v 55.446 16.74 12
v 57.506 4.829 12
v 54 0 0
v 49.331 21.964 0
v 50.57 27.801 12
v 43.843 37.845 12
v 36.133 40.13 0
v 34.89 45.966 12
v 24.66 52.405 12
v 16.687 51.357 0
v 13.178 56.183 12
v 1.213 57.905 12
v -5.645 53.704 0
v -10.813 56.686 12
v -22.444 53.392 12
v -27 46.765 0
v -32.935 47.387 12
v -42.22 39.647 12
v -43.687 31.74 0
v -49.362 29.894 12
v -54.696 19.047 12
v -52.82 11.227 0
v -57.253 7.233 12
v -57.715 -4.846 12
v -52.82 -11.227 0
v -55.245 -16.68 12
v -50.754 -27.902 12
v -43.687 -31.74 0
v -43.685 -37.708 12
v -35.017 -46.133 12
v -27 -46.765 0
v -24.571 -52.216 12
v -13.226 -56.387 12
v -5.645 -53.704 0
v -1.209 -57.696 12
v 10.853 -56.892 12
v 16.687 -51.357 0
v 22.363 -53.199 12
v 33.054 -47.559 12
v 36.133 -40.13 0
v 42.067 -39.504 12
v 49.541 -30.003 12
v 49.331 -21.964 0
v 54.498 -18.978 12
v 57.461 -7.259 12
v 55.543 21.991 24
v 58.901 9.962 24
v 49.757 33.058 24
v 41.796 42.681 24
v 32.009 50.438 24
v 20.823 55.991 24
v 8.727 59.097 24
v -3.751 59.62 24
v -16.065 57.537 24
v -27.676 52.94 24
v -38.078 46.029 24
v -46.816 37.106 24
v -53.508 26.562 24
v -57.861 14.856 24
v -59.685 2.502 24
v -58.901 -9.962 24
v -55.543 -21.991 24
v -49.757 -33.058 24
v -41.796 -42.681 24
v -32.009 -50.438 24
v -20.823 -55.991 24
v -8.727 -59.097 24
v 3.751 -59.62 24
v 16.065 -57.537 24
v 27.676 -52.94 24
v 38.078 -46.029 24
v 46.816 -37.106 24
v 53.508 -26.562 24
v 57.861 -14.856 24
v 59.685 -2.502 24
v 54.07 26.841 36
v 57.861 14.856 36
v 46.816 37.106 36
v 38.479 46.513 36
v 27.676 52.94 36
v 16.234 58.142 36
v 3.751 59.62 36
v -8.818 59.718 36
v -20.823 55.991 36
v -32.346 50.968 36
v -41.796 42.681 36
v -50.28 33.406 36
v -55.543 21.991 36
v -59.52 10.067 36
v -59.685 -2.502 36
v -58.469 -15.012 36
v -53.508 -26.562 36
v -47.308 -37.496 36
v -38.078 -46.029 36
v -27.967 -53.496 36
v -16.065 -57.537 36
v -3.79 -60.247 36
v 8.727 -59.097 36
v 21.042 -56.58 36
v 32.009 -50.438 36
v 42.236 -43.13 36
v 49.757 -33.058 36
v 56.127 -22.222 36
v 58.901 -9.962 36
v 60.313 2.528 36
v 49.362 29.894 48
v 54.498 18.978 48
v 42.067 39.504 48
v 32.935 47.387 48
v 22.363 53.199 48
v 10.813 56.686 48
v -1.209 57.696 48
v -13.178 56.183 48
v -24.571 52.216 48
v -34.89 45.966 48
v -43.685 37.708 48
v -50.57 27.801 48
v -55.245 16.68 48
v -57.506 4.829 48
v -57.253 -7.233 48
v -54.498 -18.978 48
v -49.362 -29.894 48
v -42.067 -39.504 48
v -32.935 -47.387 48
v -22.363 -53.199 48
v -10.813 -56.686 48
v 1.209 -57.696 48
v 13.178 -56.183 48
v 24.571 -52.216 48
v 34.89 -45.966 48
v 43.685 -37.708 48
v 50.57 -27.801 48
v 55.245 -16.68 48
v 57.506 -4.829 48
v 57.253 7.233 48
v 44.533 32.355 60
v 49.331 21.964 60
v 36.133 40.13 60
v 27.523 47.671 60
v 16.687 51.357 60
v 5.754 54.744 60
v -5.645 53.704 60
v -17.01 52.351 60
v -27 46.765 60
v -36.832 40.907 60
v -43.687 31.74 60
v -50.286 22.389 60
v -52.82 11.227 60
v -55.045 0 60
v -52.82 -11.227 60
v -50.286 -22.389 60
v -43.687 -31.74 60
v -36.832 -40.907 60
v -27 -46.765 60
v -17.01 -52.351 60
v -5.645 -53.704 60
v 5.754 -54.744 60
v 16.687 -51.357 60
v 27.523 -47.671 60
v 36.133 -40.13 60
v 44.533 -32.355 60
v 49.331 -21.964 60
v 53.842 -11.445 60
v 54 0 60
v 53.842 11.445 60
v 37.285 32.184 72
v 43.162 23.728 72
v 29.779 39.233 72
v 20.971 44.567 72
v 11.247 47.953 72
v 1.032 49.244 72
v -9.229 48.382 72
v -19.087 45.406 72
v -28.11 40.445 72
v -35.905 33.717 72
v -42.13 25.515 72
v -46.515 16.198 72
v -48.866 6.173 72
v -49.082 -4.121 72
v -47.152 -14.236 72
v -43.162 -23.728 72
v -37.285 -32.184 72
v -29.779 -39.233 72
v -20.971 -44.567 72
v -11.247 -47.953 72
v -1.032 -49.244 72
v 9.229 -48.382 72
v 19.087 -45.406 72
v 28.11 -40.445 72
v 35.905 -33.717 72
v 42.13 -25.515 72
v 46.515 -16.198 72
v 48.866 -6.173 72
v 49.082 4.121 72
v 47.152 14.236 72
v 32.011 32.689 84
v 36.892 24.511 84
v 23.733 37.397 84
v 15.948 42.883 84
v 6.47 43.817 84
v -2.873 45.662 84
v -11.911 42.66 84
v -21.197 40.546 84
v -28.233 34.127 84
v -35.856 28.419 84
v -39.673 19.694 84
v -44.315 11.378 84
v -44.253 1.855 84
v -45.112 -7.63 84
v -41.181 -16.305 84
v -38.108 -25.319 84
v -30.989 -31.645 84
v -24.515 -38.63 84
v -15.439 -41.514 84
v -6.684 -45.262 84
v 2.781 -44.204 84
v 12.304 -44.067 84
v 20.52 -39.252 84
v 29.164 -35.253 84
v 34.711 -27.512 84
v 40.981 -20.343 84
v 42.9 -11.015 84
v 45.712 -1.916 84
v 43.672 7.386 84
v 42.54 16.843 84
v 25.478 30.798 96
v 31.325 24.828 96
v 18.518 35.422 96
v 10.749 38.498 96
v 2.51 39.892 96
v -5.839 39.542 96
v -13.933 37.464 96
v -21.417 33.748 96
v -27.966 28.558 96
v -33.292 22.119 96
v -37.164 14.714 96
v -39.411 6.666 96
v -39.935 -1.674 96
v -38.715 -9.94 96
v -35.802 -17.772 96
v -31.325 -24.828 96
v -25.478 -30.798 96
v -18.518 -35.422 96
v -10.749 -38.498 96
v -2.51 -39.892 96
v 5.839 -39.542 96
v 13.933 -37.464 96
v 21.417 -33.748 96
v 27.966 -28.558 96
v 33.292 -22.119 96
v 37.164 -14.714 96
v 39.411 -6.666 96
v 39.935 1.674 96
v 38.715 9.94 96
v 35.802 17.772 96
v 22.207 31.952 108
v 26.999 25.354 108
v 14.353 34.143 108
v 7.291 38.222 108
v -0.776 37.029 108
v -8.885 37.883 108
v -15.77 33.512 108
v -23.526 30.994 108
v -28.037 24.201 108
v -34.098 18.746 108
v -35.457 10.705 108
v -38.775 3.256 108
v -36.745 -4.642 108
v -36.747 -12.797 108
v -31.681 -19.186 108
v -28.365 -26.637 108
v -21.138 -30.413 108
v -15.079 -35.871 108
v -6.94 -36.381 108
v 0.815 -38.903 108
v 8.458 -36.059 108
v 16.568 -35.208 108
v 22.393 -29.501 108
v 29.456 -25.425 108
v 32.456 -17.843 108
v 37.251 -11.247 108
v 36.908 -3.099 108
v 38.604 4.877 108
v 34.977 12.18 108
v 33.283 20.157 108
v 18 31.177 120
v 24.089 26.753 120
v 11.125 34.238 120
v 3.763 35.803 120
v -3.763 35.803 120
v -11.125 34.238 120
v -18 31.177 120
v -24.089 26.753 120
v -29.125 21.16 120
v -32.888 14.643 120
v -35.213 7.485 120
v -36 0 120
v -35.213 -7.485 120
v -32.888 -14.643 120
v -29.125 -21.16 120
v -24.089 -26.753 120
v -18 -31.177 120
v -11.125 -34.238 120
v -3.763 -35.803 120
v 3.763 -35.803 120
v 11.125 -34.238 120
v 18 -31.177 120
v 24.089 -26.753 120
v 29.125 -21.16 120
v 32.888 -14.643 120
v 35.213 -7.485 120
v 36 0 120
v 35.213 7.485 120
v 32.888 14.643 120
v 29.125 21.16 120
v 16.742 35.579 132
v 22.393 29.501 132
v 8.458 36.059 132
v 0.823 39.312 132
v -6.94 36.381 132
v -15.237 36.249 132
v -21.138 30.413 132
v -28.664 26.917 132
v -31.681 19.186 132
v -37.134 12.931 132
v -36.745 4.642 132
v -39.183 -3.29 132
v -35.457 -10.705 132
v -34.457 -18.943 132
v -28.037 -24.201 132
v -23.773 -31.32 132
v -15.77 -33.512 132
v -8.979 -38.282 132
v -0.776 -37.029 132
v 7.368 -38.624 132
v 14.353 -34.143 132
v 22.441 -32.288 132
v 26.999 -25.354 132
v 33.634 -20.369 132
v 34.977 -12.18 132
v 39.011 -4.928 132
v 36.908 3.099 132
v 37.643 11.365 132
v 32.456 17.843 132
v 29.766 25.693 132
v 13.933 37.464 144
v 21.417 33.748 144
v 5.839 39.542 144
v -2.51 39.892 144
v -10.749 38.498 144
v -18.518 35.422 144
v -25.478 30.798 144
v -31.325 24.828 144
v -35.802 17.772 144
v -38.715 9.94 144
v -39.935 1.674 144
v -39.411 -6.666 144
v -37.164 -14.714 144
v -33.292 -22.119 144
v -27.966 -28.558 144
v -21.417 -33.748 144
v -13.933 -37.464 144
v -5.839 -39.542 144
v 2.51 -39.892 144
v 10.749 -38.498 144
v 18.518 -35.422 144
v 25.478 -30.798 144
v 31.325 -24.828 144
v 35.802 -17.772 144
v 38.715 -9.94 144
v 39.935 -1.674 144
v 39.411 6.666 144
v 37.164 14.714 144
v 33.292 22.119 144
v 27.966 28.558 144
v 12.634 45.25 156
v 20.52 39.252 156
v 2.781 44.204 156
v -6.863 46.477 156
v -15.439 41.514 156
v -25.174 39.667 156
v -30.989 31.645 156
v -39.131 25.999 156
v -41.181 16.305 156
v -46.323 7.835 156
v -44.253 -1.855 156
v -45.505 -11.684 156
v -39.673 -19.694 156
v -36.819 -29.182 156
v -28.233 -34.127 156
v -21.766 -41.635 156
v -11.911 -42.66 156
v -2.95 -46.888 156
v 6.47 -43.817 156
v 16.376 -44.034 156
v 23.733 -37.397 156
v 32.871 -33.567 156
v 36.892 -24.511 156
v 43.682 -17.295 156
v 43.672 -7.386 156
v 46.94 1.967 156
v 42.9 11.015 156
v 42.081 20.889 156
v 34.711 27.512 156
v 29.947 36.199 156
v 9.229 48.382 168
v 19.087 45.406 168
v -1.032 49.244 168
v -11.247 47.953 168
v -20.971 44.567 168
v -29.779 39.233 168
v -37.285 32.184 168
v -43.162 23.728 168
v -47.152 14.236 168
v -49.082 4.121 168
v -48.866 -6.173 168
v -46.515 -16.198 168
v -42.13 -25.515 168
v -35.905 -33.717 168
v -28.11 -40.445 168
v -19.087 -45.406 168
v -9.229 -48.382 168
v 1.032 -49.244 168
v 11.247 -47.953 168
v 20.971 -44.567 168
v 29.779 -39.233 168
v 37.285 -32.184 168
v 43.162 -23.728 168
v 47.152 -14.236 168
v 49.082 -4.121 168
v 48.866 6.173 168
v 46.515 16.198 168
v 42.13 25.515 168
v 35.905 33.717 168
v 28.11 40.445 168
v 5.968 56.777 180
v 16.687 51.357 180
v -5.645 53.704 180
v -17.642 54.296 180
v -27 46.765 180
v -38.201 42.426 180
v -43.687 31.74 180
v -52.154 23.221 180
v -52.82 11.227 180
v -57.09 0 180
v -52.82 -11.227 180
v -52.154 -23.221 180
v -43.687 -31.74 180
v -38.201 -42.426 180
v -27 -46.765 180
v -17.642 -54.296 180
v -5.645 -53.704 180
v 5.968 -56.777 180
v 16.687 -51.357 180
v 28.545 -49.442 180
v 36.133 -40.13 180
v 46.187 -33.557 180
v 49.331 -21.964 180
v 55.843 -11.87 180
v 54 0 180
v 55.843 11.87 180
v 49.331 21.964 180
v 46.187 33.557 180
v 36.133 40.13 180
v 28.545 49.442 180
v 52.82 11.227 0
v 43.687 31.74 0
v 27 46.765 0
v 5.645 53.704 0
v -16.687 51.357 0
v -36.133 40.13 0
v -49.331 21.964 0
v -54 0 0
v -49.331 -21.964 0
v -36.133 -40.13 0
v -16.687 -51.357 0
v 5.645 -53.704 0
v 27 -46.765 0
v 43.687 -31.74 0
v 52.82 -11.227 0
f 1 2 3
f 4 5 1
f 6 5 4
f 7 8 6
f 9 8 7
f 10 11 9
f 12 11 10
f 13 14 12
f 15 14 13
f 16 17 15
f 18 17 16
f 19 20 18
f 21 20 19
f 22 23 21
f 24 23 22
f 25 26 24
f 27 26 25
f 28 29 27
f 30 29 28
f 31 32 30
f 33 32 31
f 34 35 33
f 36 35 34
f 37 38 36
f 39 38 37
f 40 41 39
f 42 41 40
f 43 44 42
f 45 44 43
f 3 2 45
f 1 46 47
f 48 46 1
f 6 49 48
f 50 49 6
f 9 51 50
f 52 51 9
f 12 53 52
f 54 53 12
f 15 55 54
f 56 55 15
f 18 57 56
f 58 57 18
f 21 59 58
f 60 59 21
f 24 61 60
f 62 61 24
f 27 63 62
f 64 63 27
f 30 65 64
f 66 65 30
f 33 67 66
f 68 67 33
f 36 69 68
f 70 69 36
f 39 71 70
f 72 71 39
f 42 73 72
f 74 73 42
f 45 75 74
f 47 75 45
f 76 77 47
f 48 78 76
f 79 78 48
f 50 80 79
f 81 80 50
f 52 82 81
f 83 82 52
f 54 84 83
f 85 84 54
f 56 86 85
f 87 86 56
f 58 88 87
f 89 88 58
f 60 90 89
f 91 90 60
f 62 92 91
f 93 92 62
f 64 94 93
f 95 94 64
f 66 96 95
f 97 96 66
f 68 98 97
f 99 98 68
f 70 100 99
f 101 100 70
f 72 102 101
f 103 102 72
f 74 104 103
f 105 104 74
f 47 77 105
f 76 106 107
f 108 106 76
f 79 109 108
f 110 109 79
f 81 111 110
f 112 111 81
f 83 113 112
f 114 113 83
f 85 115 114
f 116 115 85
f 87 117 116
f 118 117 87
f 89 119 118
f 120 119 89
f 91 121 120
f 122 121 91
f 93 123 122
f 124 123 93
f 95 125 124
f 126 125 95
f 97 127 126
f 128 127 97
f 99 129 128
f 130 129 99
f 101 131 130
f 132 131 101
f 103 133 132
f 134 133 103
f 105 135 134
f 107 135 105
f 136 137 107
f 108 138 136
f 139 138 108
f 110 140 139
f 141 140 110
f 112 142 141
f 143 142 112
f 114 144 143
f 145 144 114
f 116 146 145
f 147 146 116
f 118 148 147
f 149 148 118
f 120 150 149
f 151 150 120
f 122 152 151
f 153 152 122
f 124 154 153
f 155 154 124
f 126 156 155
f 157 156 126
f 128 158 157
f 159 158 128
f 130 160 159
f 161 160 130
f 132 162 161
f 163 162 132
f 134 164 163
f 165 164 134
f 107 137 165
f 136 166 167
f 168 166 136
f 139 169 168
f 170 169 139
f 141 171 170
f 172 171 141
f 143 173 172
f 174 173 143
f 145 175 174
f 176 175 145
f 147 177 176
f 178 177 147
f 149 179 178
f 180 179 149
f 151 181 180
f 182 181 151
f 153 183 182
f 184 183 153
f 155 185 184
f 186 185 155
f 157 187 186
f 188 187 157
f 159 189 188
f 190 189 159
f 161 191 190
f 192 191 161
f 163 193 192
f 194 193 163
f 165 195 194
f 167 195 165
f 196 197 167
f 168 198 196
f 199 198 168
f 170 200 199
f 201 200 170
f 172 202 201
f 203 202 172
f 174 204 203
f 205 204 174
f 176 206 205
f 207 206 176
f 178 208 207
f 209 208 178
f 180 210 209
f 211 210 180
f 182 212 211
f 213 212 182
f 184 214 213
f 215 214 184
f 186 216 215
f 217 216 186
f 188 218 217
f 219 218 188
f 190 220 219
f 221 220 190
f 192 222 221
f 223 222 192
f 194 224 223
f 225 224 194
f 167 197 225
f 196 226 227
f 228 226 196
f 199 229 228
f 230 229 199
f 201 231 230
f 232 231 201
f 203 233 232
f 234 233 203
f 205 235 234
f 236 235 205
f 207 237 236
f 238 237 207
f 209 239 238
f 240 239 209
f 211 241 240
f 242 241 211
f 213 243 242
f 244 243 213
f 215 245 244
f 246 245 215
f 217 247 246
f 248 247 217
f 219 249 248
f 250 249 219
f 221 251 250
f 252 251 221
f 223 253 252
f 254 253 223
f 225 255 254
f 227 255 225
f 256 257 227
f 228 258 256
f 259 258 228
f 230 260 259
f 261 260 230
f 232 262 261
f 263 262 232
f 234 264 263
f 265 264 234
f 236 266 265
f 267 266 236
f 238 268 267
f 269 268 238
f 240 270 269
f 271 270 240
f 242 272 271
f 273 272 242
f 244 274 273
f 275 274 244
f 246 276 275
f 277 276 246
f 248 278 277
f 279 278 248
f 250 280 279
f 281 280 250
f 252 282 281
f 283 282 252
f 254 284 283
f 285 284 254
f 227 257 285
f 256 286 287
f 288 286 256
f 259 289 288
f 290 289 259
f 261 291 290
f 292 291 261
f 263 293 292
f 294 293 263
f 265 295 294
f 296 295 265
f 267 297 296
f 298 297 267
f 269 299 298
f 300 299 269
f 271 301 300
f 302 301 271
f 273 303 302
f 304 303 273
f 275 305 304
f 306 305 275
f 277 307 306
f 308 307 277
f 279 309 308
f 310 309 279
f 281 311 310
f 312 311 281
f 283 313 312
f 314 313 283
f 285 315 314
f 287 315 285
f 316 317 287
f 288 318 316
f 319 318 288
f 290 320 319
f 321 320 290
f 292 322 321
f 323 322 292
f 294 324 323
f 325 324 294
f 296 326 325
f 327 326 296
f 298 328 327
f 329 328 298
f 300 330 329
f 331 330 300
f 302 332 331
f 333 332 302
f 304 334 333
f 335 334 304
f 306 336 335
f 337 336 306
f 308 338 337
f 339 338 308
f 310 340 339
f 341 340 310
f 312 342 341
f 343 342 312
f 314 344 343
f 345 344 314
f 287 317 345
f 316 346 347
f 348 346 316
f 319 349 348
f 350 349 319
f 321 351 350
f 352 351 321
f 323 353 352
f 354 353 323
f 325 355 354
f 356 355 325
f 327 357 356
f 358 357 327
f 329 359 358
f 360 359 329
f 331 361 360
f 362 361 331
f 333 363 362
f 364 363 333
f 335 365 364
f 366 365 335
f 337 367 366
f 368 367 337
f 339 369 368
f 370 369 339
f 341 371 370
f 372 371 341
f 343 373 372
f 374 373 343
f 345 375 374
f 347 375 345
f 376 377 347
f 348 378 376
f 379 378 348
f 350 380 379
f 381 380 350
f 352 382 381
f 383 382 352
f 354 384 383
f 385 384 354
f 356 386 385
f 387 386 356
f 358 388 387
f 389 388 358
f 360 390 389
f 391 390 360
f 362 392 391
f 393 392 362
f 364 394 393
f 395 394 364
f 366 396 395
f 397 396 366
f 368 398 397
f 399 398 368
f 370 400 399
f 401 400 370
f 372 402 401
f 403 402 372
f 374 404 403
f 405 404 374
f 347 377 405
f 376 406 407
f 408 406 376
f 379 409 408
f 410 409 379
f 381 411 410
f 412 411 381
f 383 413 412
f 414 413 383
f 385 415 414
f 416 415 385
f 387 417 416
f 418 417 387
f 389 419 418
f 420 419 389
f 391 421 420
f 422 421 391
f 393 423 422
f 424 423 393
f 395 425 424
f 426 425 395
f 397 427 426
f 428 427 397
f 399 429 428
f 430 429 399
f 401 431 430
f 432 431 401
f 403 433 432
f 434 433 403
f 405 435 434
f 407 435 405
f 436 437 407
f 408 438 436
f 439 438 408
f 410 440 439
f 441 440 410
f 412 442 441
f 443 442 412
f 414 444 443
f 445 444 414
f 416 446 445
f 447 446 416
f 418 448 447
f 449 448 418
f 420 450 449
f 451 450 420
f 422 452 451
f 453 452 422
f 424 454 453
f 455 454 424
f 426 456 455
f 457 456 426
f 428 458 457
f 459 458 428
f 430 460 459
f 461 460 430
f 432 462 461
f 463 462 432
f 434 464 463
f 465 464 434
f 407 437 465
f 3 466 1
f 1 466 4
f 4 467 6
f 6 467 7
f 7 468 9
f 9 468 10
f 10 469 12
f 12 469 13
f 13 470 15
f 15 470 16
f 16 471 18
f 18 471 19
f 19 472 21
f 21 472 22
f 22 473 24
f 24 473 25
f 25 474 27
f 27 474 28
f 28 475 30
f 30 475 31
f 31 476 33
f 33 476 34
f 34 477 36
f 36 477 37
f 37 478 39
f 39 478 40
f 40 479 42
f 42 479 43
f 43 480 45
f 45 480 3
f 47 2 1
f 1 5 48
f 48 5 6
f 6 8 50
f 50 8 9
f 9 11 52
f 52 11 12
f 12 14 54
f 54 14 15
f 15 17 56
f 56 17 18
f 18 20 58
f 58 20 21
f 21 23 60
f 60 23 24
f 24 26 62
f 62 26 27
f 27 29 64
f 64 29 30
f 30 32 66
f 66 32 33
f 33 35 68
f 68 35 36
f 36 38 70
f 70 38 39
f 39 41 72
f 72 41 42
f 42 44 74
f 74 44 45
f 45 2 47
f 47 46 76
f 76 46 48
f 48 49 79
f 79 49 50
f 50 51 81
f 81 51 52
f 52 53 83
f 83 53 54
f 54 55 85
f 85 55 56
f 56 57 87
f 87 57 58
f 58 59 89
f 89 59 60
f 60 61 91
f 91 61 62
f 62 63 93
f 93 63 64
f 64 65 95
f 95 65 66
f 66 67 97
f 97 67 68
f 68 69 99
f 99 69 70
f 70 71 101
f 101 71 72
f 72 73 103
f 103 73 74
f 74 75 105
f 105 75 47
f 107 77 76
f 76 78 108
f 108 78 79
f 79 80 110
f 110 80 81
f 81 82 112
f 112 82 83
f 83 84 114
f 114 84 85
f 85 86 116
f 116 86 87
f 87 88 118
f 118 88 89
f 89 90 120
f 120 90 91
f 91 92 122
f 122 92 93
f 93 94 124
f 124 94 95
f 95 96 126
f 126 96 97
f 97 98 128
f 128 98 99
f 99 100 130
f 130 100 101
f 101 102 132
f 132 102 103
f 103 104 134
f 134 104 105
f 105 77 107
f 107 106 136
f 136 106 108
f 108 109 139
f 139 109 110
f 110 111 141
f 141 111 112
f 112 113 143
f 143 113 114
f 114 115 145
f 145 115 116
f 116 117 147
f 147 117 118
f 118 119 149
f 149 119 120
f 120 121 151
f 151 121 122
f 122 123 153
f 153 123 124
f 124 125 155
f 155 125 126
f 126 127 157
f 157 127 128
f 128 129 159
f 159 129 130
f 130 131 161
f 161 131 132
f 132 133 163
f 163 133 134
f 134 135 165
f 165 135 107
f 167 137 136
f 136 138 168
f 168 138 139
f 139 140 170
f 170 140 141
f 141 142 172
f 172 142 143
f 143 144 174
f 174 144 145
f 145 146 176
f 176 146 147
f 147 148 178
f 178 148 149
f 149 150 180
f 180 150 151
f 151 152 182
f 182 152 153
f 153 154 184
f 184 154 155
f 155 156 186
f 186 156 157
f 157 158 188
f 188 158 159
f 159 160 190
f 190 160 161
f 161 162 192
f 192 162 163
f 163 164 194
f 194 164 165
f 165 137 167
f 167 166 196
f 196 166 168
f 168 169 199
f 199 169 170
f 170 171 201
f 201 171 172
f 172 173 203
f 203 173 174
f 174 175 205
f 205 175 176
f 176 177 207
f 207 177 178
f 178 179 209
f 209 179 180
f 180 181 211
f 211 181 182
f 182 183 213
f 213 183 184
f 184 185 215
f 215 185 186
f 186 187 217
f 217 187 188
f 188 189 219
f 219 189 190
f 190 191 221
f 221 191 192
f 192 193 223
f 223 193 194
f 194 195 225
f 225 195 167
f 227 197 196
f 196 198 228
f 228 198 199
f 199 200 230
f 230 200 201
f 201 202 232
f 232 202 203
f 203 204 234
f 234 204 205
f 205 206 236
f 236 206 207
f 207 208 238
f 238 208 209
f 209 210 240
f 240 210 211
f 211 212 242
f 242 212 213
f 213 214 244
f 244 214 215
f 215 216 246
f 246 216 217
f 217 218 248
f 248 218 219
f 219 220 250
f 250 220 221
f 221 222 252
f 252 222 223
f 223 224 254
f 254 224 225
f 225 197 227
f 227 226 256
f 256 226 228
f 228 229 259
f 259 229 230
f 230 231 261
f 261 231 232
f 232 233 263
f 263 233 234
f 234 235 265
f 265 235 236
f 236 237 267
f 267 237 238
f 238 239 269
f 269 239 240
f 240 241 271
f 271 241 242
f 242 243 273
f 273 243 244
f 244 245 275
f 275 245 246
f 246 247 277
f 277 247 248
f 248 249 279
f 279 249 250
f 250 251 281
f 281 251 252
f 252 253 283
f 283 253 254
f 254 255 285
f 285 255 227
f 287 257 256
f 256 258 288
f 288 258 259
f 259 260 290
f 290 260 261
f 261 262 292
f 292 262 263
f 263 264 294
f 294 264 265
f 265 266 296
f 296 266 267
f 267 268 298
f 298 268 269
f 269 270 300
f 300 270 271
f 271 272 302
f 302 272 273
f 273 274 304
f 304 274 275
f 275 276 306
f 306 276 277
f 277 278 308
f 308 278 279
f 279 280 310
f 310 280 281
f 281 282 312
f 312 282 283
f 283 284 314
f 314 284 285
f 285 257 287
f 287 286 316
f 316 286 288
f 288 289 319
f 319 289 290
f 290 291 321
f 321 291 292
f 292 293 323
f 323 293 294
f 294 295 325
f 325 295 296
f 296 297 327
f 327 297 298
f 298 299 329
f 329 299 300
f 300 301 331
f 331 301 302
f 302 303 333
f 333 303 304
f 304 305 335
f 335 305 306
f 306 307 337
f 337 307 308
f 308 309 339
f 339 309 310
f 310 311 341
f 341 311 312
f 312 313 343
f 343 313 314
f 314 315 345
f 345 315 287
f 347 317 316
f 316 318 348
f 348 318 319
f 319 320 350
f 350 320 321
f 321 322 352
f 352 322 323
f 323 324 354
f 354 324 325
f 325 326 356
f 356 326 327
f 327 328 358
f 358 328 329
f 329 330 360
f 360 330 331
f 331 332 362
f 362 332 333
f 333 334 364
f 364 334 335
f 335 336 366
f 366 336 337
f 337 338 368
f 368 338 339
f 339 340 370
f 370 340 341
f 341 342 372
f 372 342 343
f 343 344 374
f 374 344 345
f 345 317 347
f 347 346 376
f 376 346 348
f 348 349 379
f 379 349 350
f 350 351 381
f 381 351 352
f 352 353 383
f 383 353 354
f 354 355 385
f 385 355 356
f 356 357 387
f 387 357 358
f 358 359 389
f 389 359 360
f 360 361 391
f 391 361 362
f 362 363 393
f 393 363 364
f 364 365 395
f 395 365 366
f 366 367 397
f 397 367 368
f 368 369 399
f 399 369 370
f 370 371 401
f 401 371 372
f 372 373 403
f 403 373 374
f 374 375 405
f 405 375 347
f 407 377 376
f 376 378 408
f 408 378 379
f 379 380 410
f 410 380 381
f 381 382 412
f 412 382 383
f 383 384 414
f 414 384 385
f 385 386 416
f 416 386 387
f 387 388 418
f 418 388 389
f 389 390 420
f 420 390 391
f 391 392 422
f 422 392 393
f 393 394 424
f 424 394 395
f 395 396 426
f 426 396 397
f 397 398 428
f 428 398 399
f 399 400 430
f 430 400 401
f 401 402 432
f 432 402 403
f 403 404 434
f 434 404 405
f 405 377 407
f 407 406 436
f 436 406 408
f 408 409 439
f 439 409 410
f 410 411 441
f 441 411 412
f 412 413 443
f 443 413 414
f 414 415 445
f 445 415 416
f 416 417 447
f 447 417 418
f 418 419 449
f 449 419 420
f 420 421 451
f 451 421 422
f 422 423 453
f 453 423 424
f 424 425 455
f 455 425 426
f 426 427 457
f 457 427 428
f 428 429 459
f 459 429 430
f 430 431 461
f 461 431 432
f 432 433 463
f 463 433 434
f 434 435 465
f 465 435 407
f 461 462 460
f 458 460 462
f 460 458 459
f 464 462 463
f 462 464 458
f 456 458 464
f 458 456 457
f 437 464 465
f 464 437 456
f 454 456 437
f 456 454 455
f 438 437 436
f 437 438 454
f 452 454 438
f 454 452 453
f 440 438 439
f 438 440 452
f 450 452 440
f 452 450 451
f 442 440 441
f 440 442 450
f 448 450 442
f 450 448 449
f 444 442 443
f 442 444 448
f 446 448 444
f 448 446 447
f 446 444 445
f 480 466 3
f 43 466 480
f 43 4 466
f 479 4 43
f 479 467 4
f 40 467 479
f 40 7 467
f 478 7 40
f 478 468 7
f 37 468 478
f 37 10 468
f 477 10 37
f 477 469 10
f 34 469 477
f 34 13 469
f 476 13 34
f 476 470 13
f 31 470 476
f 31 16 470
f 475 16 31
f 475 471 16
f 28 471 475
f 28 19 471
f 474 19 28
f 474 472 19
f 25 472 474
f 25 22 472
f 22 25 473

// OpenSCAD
// Define the shape and size parameters for the vase
shape_type = "vase2";  // Shape of the vase
base_radius = 60;       // Base radius of the vase
spike_amplitude = 10;   // Amplitude of spikes added to the surface
num_sides = 30;         // Number of sides for the vase's base (higher = smoother)
num_levels = 15;        // Number of vertical levels for detail
twist_factor = 0.4;     // Twisting factor for the shape
vase_color = "cyan";   // Visualization color

// Module to generate the vase
module vase() {
    total_height = 180 - 180 % num_levels;  // Total height adjusted to levels
    vertical_step = floor(180 / num_levels);  // Vertical step size
    angular_step = 360 / num_sides;          // Angular step size for sides

    // Generate the vertex points
    vertex_points = [
        for (z = [0:vertical_step:total_height])
            for (i = [0:angular_step:359])
                let(
                    // Calculate radius modifier based on shape and vertical position
                    radius_modifier = (shape_type == "cylinder") ? 1 :
                                     (shape_type == "vase1") ? 0.7 + 0.4 * sin(z * 1.9) :
                                     (shape_type == "vase2") ? 0.6 + 0.4 * pow(sin(z + 60), 2) :
                                     (shape_type == "glass") ? 0.6 + 0.4 * pow(sin(z * 0.7 - 30), 2) :
                                     (shape_type == "cup1") ? 0.65 + 0.3 * cos(z * 2 + 35) :
                                     (shape_type == "cup2") ? 0.6 + 0.35 * cos(180 - z + 50) * sin(180 - z * 2.5 + 45) :
                                     (shape_type == "bowl") ? 0.6 + 0.4 * sin(z * 0.5) :
                                     cos(z * 0.5),
                    // Adjust spike size dynamically
                    dynamic_spike = ((z / vertical_step) % 2 == 1 && (i / angular_step) % 2 == 1) ? spike_amplitude * sin(z * 0.1) : 0,
                    twist = z * twist_factor, // Twisting effect
                    final_radius = dynamic_spike + radius_modifier * base_radius,  // Total radius
                    x_coord = final_radius * cos(i + twist),  // X coordinate
                    y_coord = final_radius * sin(i + twist)   // Y coordinate
                )
                [x_coord, y_coord, z]
    ];

    // Define faces to connect vertices
    face_connections = concat(
        [
            for (z = [0:(total_height / vertical_step) - 1])
                for (s = [0:num_sides - 1])
                    let(
                        bottom_left = s + num_sides * z,       // Bottom-left
                        top_left = s + num_sides * (z + 1),   // Top-left
                        top_right = ((s + 1) % num_sides) + num_sides * (z + 1), // Top-right
                        bottom_right = ((s + 1) % num_sides) + num_sides * z    // Bottom-right
                    )
                    ((s + z) % 2 == 0) ? [bottom_left, top_left, top_right] : [top_left, top_right, bottom_right]
        ],
        [
            for (z = [0:(total_height / vertical_step) - 1])
                for (s = [0:num_sides - 1])
                    let(
                        bottom_left = s + num_sides * z,
                        top_left = s + num_sides * (z + 1),
                        top_right = ((s + 1) % num_sides) + num_sides * (z + 1),
                        bottom_right = ((s + 1) % num_sides) + num_sides * z
                    )
                    ((s + z) % 2 == 0) ? [top_right, bottom_right, bottom_left] : [bottom_right, bottom_left, top_left]

        ],
        (shape_type != "cone") ? [[for (s = [num_sides - 1:-1:0]) (total_height / vertical_step) * (num_sides) + s]] : [], // Top cap
        [[for (s = [0:num_sides - 1]) s]] // Bottom cap
    );

    // Apply color and scale the vase
    color(vase_color) 
    scale([1, 1, (shape_type == "bowl") ? 0.33 : 1]) 
    polyhedron(points = vertex_points, faces = face_connections);
}

// Render the vase
vase();
